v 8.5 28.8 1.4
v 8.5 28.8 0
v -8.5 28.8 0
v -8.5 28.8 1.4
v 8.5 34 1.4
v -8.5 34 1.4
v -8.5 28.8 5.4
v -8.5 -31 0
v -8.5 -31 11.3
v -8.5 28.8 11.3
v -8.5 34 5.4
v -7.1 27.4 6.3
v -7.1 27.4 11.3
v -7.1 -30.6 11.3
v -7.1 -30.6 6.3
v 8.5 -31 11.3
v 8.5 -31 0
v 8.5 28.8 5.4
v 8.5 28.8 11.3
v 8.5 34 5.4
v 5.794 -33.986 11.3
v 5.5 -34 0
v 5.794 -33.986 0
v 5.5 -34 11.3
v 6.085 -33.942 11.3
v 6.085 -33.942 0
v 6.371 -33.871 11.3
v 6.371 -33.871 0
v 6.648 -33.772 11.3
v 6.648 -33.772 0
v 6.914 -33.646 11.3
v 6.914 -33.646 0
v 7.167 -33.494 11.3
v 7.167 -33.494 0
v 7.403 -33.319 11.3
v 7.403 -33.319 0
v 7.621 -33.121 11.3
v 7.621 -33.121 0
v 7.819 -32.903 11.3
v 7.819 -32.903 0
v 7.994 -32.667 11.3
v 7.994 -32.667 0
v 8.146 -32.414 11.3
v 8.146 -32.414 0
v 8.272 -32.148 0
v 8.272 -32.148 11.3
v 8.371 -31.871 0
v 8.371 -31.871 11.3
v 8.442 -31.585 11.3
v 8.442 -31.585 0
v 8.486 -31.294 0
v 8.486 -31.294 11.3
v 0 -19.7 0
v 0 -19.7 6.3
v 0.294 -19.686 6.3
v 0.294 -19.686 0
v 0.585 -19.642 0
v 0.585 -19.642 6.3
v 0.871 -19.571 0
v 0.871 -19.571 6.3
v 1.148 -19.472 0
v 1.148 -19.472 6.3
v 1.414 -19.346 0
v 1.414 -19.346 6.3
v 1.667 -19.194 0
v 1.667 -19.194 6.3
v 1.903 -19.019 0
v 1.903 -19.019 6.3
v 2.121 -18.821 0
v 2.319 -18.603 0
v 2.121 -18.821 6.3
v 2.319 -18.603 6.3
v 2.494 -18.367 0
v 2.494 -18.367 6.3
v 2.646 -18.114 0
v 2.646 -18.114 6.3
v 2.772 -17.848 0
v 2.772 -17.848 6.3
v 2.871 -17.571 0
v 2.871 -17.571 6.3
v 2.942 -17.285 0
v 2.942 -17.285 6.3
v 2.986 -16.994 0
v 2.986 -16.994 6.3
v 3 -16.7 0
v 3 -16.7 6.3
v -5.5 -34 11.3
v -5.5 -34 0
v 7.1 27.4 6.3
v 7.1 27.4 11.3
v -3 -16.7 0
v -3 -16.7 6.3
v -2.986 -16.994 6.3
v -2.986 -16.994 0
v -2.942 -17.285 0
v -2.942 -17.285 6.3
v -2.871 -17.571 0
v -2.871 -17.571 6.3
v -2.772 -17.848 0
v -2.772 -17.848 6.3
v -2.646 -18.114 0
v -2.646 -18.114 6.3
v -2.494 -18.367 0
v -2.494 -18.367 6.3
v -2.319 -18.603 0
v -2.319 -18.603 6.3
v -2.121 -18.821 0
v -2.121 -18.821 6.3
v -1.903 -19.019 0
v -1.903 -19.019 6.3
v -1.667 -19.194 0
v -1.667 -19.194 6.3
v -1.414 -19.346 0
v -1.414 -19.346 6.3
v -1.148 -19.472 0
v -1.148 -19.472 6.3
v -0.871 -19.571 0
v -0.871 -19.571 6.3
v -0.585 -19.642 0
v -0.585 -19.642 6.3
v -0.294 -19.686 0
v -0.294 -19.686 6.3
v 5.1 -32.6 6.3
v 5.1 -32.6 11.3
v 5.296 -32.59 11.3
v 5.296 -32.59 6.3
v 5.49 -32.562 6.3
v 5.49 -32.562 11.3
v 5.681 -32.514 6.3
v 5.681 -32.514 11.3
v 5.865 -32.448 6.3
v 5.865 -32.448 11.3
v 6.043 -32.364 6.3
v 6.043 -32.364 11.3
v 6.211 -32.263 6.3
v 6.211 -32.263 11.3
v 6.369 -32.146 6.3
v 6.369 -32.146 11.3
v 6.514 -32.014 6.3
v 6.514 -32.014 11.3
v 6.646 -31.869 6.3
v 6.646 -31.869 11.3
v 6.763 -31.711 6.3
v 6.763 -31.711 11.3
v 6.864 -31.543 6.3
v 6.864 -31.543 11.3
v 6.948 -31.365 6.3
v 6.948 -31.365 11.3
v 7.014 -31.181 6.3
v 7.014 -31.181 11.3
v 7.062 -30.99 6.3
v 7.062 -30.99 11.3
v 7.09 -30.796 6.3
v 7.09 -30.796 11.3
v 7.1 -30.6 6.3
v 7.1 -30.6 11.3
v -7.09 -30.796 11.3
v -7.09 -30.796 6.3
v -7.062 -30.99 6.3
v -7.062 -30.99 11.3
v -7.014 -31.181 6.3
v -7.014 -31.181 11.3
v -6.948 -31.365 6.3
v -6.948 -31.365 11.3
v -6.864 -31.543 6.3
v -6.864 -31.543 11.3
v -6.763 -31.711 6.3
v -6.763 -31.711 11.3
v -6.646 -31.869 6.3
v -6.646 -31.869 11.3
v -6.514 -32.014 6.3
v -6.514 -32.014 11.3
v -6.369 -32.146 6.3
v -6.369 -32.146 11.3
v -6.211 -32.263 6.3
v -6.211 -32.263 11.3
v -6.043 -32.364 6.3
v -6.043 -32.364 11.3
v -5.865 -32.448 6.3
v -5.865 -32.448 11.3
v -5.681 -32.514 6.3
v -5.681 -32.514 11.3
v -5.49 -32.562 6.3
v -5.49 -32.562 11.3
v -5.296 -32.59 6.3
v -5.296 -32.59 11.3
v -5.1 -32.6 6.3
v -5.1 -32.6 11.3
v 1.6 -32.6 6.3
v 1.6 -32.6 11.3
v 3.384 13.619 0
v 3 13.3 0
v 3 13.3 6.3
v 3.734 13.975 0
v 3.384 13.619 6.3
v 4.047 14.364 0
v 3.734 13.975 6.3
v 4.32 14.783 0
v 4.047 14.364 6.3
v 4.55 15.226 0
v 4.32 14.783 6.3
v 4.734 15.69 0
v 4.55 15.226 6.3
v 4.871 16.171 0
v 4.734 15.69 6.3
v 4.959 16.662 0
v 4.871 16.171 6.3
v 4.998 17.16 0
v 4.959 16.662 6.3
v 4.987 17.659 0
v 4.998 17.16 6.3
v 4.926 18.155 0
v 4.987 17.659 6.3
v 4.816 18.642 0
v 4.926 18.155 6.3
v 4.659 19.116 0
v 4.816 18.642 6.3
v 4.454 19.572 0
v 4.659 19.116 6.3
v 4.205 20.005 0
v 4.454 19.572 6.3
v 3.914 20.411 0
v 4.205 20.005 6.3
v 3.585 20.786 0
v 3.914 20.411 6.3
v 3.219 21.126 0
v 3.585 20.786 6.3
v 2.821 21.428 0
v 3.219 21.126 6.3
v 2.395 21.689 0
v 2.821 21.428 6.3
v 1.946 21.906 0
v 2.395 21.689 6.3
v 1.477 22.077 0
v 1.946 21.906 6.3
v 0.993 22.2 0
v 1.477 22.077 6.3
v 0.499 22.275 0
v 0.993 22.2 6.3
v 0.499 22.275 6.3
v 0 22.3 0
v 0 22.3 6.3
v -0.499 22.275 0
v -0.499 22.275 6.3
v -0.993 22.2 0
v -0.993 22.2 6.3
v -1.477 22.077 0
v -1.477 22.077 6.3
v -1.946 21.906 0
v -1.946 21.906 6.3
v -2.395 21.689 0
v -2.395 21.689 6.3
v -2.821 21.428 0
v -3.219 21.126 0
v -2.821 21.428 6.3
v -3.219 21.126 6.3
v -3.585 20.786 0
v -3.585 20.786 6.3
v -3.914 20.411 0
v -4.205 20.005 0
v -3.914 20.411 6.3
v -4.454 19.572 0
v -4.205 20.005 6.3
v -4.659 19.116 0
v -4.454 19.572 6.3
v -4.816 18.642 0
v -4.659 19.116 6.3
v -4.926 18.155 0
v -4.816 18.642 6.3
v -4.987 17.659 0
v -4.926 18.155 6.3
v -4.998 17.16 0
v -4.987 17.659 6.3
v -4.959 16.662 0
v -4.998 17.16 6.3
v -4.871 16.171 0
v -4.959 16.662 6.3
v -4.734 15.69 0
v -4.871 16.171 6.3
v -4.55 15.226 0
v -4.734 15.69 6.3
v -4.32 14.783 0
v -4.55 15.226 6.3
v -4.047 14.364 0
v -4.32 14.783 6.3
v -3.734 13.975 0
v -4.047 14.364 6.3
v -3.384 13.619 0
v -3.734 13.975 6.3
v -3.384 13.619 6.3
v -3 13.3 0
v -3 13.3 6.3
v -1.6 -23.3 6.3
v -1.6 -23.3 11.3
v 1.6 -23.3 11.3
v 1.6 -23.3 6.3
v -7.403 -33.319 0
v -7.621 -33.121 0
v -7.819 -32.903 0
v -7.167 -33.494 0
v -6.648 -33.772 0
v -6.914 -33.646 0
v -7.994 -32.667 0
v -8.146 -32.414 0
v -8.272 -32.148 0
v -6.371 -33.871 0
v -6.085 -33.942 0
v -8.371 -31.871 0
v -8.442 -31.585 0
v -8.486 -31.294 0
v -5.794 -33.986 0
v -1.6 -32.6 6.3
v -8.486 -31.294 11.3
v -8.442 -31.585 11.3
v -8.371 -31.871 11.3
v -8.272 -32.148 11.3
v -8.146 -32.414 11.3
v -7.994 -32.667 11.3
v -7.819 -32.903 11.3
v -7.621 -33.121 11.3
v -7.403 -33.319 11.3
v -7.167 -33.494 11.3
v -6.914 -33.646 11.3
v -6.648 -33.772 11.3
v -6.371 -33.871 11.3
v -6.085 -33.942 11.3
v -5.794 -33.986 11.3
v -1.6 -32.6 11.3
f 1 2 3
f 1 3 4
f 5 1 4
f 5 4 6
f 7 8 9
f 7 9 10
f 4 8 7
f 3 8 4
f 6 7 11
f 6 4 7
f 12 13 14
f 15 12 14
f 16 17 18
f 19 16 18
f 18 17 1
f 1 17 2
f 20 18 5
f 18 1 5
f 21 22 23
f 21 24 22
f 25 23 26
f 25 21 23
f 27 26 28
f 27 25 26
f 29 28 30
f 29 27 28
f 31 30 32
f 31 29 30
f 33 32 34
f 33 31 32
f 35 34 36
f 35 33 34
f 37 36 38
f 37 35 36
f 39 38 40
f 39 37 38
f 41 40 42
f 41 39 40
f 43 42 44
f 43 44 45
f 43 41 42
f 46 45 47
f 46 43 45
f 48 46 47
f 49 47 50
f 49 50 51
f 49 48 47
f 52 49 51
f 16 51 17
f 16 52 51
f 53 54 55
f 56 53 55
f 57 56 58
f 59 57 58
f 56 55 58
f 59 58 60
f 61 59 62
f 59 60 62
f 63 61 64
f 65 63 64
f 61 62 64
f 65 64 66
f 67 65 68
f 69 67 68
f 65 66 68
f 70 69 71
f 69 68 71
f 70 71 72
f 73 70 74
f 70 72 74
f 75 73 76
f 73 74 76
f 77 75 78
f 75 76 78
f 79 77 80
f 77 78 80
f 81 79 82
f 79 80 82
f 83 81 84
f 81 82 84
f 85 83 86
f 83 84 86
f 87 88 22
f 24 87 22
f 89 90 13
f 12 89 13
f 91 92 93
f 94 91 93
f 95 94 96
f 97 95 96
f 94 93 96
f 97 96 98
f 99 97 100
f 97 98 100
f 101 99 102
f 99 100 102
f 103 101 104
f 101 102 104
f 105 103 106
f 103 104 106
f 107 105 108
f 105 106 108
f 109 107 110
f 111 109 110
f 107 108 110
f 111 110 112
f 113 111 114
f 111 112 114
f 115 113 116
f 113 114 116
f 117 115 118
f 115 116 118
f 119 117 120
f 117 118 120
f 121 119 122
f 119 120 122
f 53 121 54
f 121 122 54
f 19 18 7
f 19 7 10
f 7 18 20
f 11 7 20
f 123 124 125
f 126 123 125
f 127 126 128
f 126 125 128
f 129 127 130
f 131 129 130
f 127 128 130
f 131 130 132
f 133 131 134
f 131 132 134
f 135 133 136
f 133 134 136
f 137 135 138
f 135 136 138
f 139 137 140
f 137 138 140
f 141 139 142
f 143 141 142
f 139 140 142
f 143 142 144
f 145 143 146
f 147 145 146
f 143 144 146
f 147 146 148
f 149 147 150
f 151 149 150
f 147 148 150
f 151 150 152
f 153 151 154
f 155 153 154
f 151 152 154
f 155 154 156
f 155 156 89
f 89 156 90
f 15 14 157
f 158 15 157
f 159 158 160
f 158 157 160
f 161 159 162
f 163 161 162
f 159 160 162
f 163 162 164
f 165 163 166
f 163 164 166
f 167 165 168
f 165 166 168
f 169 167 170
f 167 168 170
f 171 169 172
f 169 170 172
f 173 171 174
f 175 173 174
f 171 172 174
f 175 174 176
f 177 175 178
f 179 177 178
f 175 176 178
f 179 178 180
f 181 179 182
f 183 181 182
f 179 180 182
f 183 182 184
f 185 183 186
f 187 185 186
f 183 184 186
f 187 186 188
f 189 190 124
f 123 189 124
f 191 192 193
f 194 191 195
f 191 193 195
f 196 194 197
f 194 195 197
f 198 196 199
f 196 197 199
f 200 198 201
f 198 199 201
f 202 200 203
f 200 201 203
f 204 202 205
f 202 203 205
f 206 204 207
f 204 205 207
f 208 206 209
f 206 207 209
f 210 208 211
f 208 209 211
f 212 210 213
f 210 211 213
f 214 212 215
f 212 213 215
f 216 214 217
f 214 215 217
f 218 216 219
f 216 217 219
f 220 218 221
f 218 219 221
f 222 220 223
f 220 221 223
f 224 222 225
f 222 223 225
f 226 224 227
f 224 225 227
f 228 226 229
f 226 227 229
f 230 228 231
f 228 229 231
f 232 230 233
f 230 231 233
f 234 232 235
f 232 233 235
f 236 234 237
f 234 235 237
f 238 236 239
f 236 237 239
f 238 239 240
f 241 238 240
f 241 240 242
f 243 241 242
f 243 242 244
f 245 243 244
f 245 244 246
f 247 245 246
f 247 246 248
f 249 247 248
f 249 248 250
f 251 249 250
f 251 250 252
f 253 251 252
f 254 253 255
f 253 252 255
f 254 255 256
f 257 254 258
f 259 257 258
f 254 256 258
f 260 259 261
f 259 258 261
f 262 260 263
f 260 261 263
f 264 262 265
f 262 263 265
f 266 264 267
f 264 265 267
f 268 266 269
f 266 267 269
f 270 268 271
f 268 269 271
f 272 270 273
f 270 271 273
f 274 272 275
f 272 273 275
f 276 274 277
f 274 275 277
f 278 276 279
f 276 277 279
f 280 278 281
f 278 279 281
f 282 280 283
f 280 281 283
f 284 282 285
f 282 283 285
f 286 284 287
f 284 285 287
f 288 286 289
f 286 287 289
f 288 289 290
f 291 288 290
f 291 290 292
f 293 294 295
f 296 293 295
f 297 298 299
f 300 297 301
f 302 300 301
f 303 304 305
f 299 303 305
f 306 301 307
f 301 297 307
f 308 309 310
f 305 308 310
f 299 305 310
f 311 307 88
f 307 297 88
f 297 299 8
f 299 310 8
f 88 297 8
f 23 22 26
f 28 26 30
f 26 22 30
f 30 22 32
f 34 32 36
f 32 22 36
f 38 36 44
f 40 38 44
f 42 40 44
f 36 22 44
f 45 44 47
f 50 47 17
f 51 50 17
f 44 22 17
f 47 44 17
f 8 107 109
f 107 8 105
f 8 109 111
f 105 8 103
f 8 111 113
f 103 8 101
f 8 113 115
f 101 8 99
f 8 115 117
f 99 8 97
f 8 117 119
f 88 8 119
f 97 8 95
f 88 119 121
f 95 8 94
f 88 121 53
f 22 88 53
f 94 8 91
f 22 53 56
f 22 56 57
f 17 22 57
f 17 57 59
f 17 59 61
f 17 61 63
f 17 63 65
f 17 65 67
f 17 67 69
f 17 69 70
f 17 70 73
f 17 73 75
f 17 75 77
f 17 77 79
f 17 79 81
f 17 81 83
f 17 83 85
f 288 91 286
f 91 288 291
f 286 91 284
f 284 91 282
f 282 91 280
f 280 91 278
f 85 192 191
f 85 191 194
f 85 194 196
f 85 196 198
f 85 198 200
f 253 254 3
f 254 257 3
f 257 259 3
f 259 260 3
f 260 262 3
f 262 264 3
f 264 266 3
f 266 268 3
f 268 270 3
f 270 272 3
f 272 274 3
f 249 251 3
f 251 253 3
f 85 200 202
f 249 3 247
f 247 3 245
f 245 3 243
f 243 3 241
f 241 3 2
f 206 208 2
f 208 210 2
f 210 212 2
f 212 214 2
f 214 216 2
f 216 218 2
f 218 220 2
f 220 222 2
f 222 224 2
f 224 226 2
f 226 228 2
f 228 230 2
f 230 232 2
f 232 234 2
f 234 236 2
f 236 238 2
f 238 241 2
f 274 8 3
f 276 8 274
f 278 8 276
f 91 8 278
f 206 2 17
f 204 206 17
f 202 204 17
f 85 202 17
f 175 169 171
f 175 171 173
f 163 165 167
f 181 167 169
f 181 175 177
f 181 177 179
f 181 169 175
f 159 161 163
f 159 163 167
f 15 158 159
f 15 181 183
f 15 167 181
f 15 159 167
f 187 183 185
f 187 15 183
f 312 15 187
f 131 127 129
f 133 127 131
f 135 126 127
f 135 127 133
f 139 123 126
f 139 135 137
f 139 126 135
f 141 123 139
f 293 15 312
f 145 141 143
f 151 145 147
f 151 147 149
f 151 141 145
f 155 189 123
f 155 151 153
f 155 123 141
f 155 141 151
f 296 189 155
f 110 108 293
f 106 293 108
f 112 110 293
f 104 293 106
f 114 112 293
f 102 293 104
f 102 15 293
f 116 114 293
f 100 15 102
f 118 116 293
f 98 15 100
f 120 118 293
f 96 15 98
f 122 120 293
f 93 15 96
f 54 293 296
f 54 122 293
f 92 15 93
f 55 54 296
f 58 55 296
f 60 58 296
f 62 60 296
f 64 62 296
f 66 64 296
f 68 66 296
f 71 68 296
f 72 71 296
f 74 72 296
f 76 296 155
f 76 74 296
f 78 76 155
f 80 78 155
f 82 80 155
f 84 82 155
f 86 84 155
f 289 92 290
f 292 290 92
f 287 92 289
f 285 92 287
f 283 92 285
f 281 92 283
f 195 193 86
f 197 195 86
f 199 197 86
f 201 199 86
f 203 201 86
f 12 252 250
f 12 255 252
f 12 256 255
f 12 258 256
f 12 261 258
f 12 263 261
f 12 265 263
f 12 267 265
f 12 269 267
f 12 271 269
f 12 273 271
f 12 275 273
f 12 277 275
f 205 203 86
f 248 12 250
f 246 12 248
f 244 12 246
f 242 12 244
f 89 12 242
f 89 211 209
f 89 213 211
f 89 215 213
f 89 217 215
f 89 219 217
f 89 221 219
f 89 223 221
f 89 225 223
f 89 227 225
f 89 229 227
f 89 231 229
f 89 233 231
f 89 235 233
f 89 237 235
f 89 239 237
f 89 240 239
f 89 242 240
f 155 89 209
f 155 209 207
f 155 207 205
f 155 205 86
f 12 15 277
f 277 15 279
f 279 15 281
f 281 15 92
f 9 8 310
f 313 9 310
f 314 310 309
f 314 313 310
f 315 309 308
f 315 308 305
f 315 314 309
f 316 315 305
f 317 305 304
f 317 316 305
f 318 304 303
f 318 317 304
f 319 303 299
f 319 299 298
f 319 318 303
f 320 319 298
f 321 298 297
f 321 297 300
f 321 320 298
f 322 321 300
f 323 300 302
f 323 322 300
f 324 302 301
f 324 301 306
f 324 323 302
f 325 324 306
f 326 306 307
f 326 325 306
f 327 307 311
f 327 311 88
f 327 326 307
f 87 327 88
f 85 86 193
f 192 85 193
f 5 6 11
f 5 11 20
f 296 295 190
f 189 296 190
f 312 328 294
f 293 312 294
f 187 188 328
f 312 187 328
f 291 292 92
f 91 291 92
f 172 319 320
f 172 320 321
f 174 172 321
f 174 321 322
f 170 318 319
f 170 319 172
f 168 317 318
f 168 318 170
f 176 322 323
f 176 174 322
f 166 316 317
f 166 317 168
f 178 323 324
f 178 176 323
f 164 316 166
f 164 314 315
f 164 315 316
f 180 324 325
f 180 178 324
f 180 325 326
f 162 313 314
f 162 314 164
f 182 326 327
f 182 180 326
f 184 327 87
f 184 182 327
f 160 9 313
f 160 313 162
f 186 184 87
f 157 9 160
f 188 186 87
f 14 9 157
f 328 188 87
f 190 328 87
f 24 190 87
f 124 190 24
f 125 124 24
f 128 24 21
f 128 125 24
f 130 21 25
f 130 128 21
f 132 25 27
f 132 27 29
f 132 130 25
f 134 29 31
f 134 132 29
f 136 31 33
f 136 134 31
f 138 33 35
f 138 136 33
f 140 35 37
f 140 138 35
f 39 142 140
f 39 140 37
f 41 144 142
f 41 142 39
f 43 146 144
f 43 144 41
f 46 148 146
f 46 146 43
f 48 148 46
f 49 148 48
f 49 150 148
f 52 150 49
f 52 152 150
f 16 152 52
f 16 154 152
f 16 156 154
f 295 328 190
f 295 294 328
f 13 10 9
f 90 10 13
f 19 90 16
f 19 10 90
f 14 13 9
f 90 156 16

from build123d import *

# Parameters (mm, degrees)
F0_W      = 17
F0_H      = 68
F1_DEPTH  = 11.3
F2_R      = 3
F4_DEPTH  = 5
F6_DEPTH  = 25
F7_W      = 10.167095
F7_H      = 8.266306
F7_H_2    = 5.37331
F8_DEPTH  = 25
F9_R      = 5
F10_DEPTH = 25


with BuildPart() as f1:
    # F0 (on Top) → F1 (new body)
    with BuildSketch(Plane.XY):
        Rectangle(F0_W, F0_H)
    extrude(amount=F1_DEPTH)

    # F2
    f2_edges = [f1.edges().sort_by_distance(p)[0] for p in [
        (8.5, -34, 5.65),
        (-8.5, -34, 5.65),
    ]]
    fillet(f2_edges, radius=F2_R)

    # F3 (on face) → F4 (cut)
    with BuildSketch(Plane.XY.offset(11.3)):
        with BuildLine():
            ThreePointArc((-7.1, -30.6), (-6.514214, -32.014214), (-5.1, -32.6))
            Line((-5.1, -32.6), (-1.6, -32.6))
            Line((-1.6, -32.6), (-1.6, -23.3))
            Line((-1.6, -23.3), (1.6, -23.3))
            Line((1.6, -23.3), (1.6, -32.6))
            Line((1.6, -32.6), (5.1, -32.6))
            ThreePointArc((5.1, -32.6), (6.514214, -32.014214), (7.1, -30.6))
            Line((7.1, -30.6), (7.1, 27.4))
            Line((7.1, 27.4), (-7.1, 27.4))
            Line((-7.1, 27.4), (-7.1, -30.6))
        make_face()
    extrude(amount=-F4_DEPTH, mode=Mode.SUBTRACT)

    # F5 (on face) → F6 (cut)
    with BuildSketch(Plane.XY.offset(6.3)):
        with BuildLine():
            ThreePointArc((0, -19.7), (2.12132, -18.82132), (3, -16.7))
            Line((3, -16.7), (3, 17.3))
            ThreePointArc((3, 17.3), (2.12132, 19.42132), (0, 20.3))
            ThreePointArc((0, 20.3), (-2.12132, 19.42132), (-3, 17.3))
            Line((-3, 17.3), (-3, -16.7))
            ThreePointArc((-3, -16.7), (-2.12132, -18.82132), (0, -19.7))
        make_face()
    extrude(amount=-F6_DEPTH, mode=Mode.SUBTRACT)

    # F7 (on face) → F8 (cut)
    with BuildSketch(Plane.YZ.offset(8.5)):
        with Locations((33.883547, 9.533153)):
            Rectangle(F7_W, F7_H)
        with Locations((33.883547, -1.286655)):
            Rectangle(F7_W, F7_H_2)
    extrude(amount=-F8_DEPTH, mode=Mode.SUBTRACT)

    # F9 (on face) → F10 (cut)
    with BuildSketch(Plane.XY.offset(6.3)):
        with Locations((0, 17.3)):
            Circle(F9_R)
    extrude(amount=-F10_DEPTH, mode=Mode.SUBTRACT)


solid = f1.part
